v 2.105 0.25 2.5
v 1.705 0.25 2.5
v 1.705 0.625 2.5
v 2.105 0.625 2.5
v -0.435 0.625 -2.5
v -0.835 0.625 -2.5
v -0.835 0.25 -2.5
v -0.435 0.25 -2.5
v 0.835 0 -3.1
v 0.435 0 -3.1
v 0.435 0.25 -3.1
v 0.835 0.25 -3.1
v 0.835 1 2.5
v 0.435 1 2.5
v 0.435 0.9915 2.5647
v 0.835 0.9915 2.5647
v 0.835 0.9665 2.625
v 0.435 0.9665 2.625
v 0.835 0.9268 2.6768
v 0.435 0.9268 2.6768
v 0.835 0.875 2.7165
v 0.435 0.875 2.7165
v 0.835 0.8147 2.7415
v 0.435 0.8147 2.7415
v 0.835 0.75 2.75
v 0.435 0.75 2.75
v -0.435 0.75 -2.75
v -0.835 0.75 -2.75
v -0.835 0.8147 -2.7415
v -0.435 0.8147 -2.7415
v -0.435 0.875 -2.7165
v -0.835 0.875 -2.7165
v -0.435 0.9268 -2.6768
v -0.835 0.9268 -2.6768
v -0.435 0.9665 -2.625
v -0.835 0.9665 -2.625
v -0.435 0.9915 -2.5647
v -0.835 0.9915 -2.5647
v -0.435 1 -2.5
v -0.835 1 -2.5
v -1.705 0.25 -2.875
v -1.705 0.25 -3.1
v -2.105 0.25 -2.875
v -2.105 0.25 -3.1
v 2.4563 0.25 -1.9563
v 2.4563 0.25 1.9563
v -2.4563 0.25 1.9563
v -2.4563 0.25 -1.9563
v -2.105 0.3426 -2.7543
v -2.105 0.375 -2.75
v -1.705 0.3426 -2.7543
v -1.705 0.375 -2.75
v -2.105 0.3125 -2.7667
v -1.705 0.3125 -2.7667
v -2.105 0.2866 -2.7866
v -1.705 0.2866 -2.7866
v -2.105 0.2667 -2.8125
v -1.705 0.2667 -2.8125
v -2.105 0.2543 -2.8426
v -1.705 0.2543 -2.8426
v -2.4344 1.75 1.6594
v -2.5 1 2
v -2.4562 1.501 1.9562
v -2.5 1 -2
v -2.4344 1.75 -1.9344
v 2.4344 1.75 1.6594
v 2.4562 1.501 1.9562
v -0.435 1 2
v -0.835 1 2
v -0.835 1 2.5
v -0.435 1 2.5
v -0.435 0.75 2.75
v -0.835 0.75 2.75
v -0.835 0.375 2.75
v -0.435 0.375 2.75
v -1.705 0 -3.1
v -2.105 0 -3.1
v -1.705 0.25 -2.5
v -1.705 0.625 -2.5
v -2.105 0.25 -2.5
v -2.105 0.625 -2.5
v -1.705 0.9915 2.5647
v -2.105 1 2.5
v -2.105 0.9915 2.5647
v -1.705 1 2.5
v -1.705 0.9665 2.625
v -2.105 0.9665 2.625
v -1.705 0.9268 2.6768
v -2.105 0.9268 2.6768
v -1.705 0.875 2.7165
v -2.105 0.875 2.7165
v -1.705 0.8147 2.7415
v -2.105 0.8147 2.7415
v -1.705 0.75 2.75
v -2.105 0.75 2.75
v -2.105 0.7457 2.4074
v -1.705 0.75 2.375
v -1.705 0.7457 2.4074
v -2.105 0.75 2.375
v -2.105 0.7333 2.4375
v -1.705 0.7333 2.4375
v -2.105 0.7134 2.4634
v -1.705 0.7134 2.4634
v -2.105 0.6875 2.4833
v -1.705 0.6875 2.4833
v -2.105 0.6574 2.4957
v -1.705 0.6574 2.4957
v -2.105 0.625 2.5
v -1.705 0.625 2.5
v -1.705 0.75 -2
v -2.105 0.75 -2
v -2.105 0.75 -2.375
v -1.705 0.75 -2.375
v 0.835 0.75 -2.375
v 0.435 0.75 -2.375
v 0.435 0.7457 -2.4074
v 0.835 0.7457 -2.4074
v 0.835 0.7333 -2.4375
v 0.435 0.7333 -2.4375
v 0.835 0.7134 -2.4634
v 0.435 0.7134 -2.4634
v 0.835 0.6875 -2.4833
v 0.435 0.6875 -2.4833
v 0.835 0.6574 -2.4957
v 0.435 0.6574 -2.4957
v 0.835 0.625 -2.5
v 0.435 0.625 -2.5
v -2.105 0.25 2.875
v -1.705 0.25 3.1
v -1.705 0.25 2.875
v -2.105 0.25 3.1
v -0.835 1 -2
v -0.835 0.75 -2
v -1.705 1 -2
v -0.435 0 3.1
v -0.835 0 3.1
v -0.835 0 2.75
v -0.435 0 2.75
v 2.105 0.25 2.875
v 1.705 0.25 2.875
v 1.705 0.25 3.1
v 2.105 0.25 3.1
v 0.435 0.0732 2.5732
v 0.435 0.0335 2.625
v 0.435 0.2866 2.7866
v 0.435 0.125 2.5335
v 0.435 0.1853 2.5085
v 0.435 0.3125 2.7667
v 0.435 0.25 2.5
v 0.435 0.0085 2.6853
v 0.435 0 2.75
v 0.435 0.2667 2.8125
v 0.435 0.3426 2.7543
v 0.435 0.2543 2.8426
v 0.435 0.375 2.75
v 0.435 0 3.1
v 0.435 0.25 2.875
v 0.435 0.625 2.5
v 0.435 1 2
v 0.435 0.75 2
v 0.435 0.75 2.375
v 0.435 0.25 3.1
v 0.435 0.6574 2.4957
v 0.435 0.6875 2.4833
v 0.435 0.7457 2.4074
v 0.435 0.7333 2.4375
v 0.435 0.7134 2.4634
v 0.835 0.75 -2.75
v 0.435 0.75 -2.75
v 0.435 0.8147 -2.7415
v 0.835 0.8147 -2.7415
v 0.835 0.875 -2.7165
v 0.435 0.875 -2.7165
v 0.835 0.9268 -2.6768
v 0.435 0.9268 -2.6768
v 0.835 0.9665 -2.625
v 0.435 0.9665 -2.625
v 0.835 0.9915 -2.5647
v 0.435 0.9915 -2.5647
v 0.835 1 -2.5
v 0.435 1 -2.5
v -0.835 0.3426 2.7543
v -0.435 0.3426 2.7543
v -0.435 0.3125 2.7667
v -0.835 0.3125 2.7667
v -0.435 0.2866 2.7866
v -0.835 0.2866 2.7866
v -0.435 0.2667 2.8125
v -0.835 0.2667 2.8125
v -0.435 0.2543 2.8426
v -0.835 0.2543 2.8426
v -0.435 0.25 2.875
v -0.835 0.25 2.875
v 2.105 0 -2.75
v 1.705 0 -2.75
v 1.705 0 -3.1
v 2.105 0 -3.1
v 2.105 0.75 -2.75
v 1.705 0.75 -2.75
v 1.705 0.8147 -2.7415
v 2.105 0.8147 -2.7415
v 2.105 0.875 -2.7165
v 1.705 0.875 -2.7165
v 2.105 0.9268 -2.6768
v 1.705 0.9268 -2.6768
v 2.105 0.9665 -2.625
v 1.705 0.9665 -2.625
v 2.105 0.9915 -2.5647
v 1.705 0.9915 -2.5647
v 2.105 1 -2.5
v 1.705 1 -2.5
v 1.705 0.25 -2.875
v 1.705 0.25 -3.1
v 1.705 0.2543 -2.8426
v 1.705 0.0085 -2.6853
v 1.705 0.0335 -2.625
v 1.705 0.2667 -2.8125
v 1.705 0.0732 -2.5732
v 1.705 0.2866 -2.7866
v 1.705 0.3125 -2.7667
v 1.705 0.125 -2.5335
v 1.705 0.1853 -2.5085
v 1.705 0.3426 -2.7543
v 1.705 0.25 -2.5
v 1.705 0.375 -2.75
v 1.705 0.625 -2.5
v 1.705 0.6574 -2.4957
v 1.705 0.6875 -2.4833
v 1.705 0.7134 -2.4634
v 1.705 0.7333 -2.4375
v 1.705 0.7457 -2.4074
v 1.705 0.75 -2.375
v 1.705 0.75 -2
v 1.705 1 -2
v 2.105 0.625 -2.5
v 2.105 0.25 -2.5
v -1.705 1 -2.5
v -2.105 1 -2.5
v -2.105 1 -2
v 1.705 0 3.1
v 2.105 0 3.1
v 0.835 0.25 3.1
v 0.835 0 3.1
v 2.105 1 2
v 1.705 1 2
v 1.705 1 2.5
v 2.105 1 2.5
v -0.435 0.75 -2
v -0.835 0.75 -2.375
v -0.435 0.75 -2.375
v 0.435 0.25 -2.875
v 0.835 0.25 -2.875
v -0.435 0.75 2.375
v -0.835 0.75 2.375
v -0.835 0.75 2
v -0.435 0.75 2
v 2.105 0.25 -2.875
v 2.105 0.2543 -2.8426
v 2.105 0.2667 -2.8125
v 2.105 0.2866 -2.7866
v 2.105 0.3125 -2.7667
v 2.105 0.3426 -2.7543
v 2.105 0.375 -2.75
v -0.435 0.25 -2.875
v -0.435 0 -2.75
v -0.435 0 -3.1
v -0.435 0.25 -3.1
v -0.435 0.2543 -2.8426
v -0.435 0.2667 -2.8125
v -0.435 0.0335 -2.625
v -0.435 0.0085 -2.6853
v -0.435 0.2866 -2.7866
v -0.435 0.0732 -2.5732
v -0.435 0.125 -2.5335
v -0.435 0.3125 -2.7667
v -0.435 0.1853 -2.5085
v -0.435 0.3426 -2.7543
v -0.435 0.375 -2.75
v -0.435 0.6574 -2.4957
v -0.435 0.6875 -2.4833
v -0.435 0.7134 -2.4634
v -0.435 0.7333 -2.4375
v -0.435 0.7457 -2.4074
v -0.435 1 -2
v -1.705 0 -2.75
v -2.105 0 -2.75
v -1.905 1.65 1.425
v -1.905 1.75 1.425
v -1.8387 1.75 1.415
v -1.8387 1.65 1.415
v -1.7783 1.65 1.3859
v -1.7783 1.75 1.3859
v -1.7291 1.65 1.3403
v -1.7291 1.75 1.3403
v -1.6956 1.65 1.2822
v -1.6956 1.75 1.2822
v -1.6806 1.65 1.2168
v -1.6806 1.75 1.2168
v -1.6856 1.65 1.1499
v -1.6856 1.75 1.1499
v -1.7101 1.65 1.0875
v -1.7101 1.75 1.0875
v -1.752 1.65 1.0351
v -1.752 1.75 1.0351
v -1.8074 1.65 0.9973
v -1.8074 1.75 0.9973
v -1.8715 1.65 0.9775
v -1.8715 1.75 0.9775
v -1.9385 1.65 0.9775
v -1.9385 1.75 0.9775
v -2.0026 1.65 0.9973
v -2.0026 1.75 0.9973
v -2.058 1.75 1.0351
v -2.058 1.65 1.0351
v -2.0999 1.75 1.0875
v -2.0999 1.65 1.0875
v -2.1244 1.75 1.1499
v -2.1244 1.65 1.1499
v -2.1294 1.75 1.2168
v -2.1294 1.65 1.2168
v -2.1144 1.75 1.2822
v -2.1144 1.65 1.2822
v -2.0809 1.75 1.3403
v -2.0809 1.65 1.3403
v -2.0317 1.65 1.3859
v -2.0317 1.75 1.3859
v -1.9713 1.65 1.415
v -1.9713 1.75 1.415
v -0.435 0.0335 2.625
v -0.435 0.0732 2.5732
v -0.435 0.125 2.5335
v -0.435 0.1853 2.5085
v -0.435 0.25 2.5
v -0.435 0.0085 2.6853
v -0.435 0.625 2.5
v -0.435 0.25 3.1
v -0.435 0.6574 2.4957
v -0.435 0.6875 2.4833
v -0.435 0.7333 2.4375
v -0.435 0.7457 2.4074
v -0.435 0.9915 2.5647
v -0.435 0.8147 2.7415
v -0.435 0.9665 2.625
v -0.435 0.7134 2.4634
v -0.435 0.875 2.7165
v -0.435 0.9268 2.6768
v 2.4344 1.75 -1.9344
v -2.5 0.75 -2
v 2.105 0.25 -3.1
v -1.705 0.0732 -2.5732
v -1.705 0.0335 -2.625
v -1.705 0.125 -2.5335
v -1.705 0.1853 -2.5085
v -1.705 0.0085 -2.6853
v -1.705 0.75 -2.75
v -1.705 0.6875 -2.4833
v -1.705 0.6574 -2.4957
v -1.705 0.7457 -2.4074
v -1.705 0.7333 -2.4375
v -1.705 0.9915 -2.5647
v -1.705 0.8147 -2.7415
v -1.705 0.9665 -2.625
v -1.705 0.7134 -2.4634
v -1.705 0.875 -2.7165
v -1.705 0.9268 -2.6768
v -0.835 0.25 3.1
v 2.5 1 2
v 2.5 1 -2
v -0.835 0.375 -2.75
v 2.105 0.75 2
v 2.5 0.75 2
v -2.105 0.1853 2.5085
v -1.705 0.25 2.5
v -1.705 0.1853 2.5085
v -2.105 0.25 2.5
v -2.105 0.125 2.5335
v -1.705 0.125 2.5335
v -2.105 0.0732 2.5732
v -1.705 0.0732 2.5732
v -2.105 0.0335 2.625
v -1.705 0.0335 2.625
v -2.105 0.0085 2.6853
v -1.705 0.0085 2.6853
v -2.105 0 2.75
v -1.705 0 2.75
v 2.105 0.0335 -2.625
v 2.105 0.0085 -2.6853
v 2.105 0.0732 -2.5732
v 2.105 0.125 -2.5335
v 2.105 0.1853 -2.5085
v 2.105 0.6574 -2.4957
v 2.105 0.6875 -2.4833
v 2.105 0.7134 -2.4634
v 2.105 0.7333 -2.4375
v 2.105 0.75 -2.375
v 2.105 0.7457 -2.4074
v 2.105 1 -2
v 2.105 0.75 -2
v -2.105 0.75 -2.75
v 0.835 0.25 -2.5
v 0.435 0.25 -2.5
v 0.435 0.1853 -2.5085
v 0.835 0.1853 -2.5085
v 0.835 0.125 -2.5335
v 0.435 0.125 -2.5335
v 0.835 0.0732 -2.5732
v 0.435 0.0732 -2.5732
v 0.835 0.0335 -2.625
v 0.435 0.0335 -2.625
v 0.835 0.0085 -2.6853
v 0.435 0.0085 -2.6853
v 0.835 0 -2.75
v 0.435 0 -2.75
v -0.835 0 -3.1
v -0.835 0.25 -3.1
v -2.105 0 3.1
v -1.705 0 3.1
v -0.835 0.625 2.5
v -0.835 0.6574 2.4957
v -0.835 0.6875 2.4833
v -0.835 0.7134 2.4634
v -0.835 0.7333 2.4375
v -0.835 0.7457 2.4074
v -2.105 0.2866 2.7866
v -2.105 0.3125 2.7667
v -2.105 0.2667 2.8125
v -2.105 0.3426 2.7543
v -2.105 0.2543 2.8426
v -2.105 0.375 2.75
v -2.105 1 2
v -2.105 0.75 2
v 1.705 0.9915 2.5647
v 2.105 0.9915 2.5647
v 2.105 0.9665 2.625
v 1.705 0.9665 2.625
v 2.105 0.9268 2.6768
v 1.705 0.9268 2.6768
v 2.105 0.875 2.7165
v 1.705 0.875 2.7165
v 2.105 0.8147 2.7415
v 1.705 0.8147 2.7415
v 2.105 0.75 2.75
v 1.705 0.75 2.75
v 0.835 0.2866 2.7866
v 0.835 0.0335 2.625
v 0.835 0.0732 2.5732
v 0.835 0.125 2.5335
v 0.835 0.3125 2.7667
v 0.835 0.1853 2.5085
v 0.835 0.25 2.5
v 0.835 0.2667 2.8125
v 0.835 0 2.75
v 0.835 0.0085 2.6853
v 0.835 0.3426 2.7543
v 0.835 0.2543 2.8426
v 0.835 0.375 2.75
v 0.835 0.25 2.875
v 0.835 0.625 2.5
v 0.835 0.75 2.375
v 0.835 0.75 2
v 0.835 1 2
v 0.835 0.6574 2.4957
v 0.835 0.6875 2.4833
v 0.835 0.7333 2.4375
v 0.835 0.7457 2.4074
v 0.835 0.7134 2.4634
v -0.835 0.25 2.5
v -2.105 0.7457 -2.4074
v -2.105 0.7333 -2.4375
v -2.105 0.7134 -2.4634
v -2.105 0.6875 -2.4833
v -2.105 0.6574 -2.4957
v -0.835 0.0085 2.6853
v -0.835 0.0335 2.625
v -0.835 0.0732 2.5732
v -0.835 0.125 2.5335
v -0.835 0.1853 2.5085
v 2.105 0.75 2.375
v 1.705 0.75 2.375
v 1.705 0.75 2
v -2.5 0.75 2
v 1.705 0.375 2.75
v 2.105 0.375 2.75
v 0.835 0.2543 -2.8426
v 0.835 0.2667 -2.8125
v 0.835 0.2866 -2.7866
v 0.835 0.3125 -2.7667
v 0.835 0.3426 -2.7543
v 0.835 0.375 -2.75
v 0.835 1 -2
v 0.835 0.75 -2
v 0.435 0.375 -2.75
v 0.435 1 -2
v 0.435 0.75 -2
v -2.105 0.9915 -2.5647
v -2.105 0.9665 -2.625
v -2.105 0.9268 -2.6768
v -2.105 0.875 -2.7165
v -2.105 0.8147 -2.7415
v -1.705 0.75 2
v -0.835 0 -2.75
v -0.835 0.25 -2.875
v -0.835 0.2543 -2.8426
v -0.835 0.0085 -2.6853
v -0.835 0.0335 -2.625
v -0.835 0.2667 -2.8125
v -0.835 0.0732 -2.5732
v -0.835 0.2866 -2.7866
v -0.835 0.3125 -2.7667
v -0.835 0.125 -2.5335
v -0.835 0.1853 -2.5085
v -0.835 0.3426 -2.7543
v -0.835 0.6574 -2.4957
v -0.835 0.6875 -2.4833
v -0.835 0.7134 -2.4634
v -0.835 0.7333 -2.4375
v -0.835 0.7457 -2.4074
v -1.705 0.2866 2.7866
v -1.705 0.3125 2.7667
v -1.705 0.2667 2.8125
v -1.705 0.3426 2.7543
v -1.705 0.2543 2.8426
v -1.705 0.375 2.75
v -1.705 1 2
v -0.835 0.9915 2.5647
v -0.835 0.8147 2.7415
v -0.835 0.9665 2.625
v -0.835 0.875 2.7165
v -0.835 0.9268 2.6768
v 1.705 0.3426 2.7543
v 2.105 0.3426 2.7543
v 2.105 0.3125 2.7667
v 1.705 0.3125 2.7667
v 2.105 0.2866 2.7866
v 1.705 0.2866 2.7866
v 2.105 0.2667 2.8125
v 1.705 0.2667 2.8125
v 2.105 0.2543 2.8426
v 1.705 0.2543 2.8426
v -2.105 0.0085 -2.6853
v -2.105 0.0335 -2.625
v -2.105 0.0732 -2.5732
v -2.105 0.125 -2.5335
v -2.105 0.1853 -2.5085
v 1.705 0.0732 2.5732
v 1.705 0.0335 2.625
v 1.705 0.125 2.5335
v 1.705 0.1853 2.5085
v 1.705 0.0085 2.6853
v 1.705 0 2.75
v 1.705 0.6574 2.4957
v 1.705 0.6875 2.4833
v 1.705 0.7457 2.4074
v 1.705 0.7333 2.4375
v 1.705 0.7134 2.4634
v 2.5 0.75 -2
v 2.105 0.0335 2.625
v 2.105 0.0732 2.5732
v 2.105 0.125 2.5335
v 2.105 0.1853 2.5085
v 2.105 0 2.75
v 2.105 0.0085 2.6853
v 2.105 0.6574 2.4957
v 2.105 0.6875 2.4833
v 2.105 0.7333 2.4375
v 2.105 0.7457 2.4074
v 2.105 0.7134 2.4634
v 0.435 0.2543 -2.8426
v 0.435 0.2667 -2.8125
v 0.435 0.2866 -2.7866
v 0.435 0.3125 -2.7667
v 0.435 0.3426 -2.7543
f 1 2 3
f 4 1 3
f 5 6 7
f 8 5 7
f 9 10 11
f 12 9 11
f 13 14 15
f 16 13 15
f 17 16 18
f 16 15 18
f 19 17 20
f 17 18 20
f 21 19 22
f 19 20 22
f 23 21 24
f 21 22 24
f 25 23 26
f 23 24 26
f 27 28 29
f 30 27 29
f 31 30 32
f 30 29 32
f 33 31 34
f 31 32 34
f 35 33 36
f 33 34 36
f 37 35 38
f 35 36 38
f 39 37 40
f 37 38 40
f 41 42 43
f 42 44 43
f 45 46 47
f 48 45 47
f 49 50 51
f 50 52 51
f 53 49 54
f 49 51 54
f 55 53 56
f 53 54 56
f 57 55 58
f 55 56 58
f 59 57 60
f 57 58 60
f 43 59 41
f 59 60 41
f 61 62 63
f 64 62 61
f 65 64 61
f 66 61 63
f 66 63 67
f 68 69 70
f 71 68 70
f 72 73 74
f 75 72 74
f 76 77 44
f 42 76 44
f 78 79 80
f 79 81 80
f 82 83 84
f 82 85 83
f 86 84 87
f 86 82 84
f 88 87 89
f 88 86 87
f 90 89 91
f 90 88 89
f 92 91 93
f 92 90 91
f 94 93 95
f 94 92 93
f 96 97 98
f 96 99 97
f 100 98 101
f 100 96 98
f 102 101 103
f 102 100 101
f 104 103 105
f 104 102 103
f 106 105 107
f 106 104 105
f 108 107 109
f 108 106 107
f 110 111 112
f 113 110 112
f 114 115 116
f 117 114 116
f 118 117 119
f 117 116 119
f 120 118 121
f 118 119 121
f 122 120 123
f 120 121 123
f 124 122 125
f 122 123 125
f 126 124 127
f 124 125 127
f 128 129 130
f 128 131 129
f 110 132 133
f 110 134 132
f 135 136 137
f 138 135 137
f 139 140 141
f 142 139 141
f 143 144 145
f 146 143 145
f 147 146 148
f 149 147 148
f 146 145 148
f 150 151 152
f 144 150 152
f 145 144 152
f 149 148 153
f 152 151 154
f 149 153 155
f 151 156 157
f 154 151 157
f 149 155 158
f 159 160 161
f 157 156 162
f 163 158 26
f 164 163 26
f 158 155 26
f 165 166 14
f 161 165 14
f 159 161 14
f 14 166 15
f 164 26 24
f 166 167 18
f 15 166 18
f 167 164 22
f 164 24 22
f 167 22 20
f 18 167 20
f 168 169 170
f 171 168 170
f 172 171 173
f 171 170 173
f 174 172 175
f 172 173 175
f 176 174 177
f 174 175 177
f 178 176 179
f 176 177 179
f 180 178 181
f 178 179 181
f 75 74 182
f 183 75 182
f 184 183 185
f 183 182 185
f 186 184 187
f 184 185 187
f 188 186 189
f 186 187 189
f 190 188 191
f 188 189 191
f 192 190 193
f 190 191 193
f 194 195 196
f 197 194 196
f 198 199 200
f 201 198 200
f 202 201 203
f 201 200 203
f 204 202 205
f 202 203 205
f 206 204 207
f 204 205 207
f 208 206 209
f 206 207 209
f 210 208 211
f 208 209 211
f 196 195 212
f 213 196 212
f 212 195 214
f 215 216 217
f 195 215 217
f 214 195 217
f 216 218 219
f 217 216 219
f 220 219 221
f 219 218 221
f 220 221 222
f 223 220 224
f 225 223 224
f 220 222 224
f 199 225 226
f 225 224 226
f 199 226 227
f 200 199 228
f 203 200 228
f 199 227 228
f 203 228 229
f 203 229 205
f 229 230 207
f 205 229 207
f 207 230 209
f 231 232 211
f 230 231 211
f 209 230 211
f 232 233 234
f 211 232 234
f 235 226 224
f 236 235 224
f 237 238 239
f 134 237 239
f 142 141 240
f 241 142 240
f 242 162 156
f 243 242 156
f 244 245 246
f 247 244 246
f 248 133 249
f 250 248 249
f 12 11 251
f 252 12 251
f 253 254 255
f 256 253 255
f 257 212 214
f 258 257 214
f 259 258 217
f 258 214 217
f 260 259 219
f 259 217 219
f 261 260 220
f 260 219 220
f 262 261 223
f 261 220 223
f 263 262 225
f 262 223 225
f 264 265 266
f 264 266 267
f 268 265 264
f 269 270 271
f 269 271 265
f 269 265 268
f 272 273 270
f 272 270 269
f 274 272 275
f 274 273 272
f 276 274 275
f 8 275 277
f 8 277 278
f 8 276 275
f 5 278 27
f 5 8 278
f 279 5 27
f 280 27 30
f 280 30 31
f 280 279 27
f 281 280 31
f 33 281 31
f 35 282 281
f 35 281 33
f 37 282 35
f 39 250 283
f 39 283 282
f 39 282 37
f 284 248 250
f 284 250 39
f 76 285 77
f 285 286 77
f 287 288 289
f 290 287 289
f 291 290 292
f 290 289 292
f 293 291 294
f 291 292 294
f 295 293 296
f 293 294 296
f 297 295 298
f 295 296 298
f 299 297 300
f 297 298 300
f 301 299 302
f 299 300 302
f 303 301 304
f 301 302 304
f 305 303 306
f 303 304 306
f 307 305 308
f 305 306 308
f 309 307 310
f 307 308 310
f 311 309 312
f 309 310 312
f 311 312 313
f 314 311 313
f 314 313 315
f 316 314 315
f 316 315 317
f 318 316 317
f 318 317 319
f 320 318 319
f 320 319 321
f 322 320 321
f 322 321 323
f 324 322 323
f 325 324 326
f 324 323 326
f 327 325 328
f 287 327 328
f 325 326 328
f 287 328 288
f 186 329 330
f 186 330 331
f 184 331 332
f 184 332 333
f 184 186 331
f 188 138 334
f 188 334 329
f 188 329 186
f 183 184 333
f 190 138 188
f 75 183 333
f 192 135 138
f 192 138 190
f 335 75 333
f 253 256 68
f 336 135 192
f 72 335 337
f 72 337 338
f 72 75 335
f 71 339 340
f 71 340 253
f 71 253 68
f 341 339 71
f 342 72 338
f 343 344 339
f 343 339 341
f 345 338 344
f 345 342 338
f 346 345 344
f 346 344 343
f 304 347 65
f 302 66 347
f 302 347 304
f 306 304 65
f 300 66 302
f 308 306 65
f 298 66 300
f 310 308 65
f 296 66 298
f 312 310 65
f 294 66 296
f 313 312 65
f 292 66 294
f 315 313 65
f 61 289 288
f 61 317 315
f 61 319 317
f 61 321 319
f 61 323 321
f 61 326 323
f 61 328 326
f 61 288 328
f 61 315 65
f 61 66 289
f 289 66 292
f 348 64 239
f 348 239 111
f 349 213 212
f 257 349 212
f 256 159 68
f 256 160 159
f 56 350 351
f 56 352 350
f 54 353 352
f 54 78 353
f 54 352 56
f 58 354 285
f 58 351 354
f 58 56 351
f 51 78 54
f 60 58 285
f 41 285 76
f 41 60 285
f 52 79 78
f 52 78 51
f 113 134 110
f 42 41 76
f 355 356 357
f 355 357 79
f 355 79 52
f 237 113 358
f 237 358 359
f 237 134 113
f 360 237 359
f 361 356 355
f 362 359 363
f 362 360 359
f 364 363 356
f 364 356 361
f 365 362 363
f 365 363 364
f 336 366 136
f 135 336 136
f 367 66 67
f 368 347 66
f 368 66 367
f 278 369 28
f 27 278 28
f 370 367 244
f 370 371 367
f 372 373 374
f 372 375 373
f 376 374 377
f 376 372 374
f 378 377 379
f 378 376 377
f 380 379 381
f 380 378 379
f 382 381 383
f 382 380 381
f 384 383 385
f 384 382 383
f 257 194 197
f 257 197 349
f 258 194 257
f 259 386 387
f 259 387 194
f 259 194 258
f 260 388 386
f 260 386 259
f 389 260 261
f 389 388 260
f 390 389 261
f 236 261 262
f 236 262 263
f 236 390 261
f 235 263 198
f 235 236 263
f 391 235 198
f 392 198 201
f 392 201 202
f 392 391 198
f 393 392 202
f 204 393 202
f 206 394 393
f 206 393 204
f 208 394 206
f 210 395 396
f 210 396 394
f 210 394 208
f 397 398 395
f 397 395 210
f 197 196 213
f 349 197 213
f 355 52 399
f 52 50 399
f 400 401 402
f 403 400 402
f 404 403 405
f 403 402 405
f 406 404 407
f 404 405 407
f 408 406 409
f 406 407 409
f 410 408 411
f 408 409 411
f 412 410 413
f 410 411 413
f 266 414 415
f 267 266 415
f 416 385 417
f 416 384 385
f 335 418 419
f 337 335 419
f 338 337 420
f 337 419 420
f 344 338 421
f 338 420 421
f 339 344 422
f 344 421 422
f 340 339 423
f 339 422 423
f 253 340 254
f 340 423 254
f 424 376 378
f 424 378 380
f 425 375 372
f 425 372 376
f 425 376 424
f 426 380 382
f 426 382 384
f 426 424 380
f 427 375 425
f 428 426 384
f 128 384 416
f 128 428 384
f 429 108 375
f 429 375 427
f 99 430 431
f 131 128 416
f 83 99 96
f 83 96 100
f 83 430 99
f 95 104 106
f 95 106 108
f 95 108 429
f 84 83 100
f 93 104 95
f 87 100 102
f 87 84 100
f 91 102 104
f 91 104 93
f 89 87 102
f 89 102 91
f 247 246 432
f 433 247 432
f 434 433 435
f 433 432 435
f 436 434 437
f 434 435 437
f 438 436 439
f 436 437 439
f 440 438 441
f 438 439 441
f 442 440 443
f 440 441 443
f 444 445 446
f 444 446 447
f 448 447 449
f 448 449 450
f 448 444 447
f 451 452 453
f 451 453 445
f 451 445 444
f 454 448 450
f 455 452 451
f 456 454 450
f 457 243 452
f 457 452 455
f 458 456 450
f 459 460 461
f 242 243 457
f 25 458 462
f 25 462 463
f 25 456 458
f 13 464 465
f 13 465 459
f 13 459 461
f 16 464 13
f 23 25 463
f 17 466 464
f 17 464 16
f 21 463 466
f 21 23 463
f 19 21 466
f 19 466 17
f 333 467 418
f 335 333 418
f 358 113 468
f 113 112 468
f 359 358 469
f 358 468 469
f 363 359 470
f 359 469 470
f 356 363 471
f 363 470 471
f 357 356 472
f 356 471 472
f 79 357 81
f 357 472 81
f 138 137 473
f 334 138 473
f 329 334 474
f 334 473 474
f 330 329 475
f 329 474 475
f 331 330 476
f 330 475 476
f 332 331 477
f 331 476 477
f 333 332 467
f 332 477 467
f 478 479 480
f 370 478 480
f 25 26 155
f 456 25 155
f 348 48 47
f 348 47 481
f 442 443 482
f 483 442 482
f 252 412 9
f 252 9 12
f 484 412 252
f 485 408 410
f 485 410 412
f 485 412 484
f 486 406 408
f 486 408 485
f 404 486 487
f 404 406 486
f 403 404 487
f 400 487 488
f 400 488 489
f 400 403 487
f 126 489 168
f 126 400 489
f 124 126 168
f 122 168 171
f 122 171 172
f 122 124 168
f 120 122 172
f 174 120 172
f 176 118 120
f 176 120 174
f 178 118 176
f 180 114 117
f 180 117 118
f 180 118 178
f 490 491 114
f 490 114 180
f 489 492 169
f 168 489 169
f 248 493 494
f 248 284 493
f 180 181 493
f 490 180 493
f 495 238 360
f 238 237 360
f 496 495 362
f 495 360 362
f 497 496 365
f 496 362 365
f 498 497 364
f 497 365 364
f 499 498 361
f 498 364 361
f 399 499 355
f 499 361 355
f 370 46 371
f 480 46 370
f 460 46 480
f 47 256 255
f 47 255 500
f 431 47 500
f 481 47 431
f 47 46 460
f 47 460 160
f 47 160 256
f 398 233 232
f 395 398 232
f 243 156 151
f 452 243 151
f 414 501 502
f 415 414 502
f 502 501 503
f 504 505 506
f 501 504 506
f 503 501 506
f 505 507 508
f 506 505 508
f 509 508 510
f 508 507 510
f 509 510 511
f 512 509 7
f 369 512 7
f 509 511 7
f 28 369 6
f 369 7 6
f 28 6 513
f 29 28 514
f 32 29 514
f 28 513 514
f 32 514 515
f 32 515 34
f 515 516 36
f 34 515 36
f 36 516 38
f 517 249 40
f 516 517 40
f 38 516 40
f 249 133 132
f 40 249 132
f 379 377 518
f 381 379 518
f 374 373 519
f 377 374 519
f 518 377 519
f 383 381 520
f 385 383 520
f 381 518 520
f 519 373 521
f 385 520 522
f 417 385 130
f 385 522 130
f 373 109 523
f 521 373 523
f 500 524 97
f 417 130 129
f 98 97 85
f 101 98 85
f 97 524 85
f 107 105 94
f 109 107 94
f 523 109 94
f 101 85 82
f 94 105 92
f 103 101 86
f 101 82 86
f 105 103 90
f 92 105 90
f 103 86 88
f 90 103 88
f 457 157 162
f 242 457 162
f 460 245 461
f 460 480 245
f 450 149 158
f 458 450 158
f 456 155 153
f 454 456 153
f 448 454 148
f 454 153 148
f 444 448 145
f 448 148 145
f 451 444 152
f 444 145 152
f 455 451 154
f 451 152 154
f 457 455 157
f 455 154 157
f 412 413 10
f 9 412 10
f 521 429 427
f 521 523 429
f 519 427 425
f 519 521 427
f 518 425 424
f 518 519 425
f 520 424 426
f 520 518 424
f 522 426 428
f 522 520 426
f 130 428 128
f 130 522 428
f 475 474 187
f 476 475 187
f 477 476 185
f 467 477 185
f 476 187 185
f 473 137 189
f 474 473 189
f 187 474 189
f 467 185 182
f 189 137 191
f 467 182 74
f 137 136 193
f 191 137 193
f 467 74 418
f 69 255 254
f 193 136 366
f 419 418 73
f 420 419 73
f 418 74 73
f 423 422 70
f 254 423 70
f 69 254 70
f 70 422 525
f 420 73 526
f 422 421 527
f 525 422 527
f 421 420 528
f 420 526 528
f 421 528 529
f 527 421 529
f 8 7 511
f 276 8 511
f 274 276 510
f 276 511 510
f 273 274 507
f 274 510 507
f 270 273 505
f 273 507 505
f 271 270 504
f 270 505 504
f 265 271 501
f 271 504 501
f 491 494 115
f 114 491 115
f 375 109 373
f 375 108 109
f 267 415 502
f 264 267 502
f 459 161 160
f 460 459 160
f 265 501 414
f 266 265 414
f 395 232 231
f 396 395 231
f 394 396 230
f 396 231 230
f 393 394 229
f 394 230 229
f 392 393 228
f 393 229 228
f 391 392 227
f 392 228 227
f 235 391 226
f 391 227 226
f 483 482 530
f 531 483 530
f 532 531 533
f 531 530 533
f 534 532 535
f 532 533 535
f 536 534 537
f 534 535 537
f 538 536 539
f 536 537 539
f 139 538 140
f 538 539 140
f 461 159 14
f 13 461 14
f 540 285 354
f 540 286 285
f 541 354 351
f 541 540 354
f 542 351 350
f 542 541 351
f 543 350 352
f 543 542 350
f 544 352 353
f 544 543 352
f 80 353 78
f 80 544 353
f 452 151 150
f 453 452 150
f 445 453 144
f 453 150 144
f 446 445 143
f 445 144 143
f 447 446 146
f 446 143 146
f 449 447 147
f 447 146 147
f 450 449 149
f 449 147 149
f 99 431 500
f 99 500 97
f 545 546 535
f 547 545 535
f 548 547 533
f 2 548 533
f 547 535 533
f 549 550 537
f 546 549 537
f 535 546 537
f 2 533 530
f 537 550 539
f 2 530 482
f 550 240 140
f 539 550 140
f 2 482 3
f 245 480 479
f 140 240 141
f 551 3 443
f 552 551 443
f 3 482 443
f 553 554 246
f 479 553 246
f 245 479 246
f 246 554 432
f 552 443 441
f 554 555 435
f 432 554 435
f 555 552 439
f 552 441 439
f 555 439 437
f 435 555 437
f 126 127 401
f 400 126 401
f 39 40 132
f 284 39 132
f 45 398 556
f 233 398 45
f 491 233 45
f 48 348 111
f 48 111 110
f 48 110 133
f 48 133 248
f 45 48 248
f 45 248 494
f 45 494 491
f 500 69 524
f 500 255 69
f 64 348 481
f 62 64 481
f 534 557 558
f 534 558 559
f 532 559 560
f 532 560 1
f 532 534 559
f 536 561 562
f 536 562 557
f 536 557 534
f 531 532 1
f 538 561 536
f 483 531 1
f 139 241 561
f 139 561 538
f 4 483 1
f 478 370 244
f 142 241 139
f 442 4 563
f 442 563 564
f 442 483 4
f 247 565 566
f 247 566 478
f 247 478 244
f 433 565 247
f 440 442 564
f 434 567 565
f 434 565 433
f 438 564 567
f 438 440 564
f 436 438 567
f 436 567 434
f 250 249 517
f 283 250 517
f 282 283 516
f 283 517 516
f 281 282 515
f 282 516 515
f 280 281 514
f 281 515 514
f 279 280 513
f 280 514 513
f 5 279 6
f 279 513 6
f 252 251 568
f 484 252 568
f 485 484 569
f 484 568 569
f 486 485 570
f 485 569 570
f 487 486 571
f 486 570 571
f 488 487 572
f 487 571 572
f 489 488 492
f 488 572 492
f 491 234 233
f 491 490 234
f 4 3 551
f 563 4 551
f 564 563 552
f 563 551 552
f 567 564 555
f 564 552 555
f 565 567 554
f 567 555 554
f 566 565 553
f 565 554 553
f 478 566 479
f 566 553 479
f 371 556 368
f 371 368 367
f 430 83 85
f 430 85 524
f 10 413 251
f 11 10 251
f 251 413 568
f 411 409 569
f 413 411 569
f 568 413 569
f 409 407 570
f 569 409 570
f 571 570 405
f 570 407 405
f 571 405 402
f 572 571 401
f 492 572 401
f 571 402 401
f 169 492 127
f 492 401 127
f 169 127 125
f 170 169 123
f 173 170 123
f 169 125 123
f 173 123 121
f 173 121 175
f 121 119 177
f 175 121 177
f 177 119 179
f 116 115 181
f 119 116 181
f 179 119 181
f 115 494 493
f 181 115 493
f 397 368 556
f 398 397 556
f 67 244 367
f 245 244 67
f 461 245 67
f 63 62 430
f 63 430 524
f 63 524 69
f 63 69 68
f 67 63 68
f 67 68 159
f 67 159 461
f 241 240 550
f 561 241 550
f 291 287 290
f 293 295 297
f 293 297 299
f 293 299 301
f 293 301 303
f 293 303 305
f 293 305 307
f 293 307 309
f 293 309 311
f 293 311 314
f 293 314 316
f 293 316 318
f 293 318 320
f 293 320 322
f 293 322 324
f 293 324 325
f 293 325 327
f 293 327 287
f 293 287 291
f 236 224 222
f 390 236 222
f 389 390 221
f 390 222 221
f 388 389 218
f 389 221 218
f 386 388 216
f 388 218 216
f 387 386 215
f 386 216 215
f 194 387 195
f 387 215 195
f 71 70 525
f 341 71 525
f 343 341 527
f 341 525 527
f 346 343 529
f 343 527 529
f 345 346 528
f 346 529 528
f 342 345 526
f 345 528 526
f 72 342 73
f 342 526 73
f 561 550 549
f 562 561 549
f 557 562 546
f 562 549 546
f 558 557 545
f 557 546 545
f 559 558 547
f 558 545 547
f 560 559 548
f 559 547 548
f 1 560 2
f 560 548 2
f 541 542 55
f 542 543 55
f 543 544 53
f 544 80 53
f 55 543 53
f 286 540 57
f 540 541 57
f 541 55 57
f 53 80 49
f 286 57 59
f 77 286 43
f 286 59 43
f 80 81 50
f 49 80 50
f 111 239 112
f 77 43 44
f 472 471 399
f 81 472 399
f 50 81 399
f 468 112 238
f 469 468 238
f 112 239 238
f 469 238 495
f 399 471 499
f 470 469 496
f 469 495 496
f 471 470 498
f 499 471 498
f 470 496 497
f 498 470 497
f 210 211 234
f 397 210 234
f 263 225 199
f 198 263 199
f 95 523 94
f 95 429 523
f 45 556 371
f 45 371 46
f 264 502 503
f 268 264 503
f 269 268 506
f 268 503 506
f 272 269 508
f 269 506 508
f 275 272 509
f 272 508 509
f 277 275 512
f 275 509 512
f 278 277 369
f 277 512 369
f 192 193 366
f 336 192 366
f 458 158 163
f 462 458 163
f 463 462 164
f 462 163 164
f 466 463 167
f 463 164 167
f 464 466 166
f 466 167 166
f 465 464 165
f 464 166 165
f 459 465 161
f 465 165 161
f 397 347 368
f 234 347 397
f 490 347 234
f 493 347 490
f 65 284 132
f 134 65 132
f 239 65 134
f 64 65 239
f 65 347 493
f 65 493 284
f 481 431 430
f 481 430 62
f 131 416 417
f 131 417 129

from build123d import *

# Parameters (mm, degrees)
SKETCH2_W            = 5
SKETCH2_H            = 4
PACKAGE_DEPTH        = 1.5
DRAFT1_START         = -2.5
DRAFT1_DEPTH         = 5
DRAFT1_START_2       = -3
DRAFT1_2_DEPTH       = 6
DRAFT2_START         = -2
DRAFT2_DEPTH         = 4
DRAFT2_START_2       = -3
DRAFT2_2_DEPTH       = 6
CHAMFER1_SIZE        = 0.25
CHAMFER1_SIZE2       = 0.275015717
LEADS_DEPTH          = 0.2
FILLET1_R            = 0.25
FILLET2_R            = 0.125
FILLET1_OF_MIRROR1_R = 0.25
FILLET2_OF_MIRROR1_R = 0.125
LPATTERN1_START      = -0.835
LPATTERN1_DEPTH      = 0.4
LPATTERN1_START_2    = 0.435
LPATTERN1_2_DEPTH    = 0.4
LPATTERN1_START_3    = 1.705
LPATTERN1_3_DEPTH    = 0.4
SKETCH4_R            = 0.225
MARKER_DEPTH         = 0.1


with BuildPart() as part:
    # Sketch2 → Package (new body)
    with BuildSketch(Plane(origin=(0, 0.25, 0), x_dir=(-1, 0, 0), z_dir=(0, 1, 0))):
        Rectangle(SKETCH2_W, SKETCH2_H)
    extrude(amount=PACKAGE_DEPTH)

    # Draft1: read off the stored shape, not the designer's step
    # Draft1 outline → Draft1 (cut)
    with BuildSketch(Plane.YZ.offset(DRAFT1_START)):
        Polygon((1.75, -2), (1.75, -1.934383502), (1, -2), align=None)
        Polygon((1, 2), (1.75, 1.934383502), (1.75, 2), align=None)
    extrude(amount=DRAFT1_DEPTH, mode=Mode.SUBTRACT)

    # Draft1 2 outline → Draft1 2 (cut)
    with BuildSketch(Plane.XY.offset(DRAFT1_START_2)):
        Polygon((-2.5, 1), (-2.434383502, 1.75), (-2.5, 1.75), align=None)
        Polygon((2.434383502, 1.75), (2.5, 1), (2.5, 1.75), align=None)
    extrude(amount=DRAFT1_2_DEPTH, mode=Mode.SUBTRACT)

    # Draft2: read off the stored shape, not the designer's step
    # Draft2 outline → Draft2 (cut)
    with BuildSketch(Plane.XY.offset(DRAFT2_START)):
        Polygon((2.5, 0.75), (2.456255668, 0.25), (2.5, 0.25), align=None)
        Polygon((-2.456255668, 0.25), (-2.5, 0.75), (-2.5, 0.25), align=None)
    extrude(amount=DRAFT2_DEPTH, mode=Mode.SUBTRACT)

    # Draft2 2 outline → Draft2 2 (cut)
    with BuildSketch(Plane.YZ.offset(DRAFT2_START_2)):
        Polygon((0.75, -2), (0.25, -1.956255668), (0.25, -2), align=None)
        Polygon((0.25, 1.956255668), (0.75, 2), (0.25, 2), align=None)
    extrude(amount=DRAFT2_2_DEPTH, mode=Mode.SUBTRACT)

    # Chamfer1
    chamfer1_edges = [part.edges().sort_by_distance(p)[0] for p in [
        (0, 1.75, 1.934383502),
    ]]
    chamfer1_side = [part.faces().sort_by_distance(p)[0] for p in [
        (0, 1.373337774, 1.967337177),
    ]]
    chamfer(chamfer1_edges, length=CHAMFER1_SIZE, length2=CHAMFER1_SIZE2, reference=chamfer1_side[0])

    # Sketch3 → Leads (add, symmetric)
    with BuildSketch(Plane.ZY.offset(1.905)):
        Polygon((-2, 1), (-2, 0.75), (2.5, 0.75), (2.5, 0), (3.1, 0), (3.1, 0.25), (2.75, 0.25), (2.75, 1), align=None)
    leads = extrude(amount=LEADS_DEPTH, both=True)

    # Fillet1
    fillet1_edges = [part.edges().sort_by_distance(p)[0] for p in [
        (-1.905, 1, 2.75),
        (-1.905, 0, 2.5),
    ]]
    fillet(fillet1_edges, radius=FILLET1_R)

    # Fillet2
    fillet2_edges = [part.edges().sort_by_distance(p)[0] for p in [
        (-1.905, 0.75, 2.5),
        (-1.905, 0.25, 2.75),
    ]]
    fillet(fillet2_edges, radius=FILLET2_R)

    # Mirror1: Leads across plane
    add(leads.mirror(Plane.XY))

    # Fillet1 of Mirror1
    fillet1_of_mirror1_edges = [part.edges().sort_by_distance(p)[0] for p in [
        (-1.905, 1, -2.75),
        (-1.905, 0, -2.5),
    ]]
    fillet(fillet1_of_mirror1_edges, radius=FILLET1_OF_MIRROR1_R)

    # Fillet2 of Mirror1
    fillet2_of_mirror1_edges = [part.edges().sort_by_distance(p)[0] for p in [
        (-1.905, 0.75, -2.5),
        (-1.905, 0.25, -2.75),
    ]]
    fillet(fillet2_of_mirror1_edges, radius=FILLET2_OF_MIRROR1_R)

    # LPattern1: read off the stored shape, not the designer's step
    # LPattern1 outline → LPattern1 (add)
    with BuildSketch(Plane.YZ.offset(LPATTERN1_START)):
        with BuildLine():
            Line((1, 2), (1, 2.5))
            ThreePointArc((1, 2.5), (0.926776695, 2.676776695), (0.75, 2.75))
            Line((0.75, 2.75), (0.375, 2.75))
            ThreePointArc((0.375, 2.75), (0.286611652, 2.786611652), (0.25, 2.875))
            Line((0.25, 2.875), (0.25, 3.1))
            Line((0.25, 3.1), (0, 3.1))
            Line((0, 3.1), (0, 2.75))
            ThreePointArc((0, 2.75), (0.073223305, 2.573223305), (0.25, 2.5))
            Line((0.25, 2.5), (0.625, 2.5))
            ThreePointArc((0.625, 2.5), (0.713388348, 2.463388348), (0.75, 2.375))
            Line((0.75, 2.375), (0.75, 2))
            Line((0.75, 2), (1, 2))
        make_face()
        with BuildLine():
            ThreePointArc((0.75, -2.75), (0.926776695, -2.676776695), (1, -2.5))
            Line((1, -2.5), (1, -2))
            Line((1, -2), (0.75, -2))
            Line((0.75, -2), (0.75, -2.375))
            ThreePointArc((0.75, -2.375), (0.713388348, -2.463388348), (0.625, -2.5))
            Line((0.625, -2.5), (0.25, -2.5))
            ThreePointArc((0.25, -2.5), (0.073223305, -2.573223305), (0, -2.75))
            Line((0, -2.75), (0, -3.1))
            Line((0, -3.1), (0.25, -3.1))
            Line((0.25, -3.1), (0.25, -2.875))
            ThreePointArc((0.25, -2.875), (0.286611652, -2.786611652), (0.375, -2.75))
            Line((0.375, -2.75), (0.75, -2.75))
        make_face()
    extrude(amount=LPATTERN1_DEPTH)

    # LPattern1 2 outline → LPattern1 2 (add)
    with BuildSketch(Plane.YZ.offset(LPATTERN1_START_2)):
        with BuildLine():
            Line((1, 2), (1, 2.5))
            ThreePointArc((1, 2.5), (0.926776695, 2.676776695), (0.75, 2.75))
            Line((0.75, 2.75), (0.375, 2.75))
            ThreePointArc((0.375, 2.75), (0.286611652, 2.786611652), (0.25, 2.875))
            Line((0.25, 2.875), (0.25, 3.1))
            Line((0.25, 3.1), (0, 3.1))
            Line((0, 3.1), (0, 2.75))
            ThreePointArc((0, 2.75), (0.073223305, 2.573223305), (0.25, 2.5))
            Line((0.25, 2.5), (0.625, 2.5))
            ThreePointArc((0.625, 2.5), (0.713388348, 2.463388348), (0.75, 2.375))
            Line((0.75, 2.375), (0.75, 2))
            Line((0.75, 2), (1, 2))
        make_face()
        with BuildLine():
            ThreePointArc((0.75, -2.75), (0.926776695, -2.676776695), (1, -2.5))
            Line((1, -2.5), (1, -2))
            Line((1, -2), (0.75, -2))
            Line((0.75, -2), (0.75, -2.375))
            ThreePointArc((0.75, -2.375), (0.713388348, -2.463388348), (0.625, -2.5))
            Line((0.625, -2.5), (0.25, -2.5))
            ThreePointArc((0.25, -2.5), (0.073223305, -2.573223305), (0, -2.75))
            Line((0, -2.75), (0, -3.1))
            Line((0, -3.1), (0.25, -3.1))
            Line((0.25, -3.1), (0.25, -2.875))
            ThreePointArc((0.25, -2.875), (0.286611652, -2.786611652), (0.375, -2.75))
            Line((0.375, -2.75), (0.75, -2.75))
        make_face()
    extrude(amount=LPATTERN1_2_DEPTH)

    # LPattern1 3 outline → LPattern1 3 (add)
    with BuildSketch(Plane.YZ.offset(LPATTERN1_START_3)):
        with BuildLine():
            Line((1, 2), (1, 2.5))
            ThreePointArc((1, 2.5), (0.926776695, 2.676776695), (0.75, 2.75))
            Line((0.75, 2.75), (0.375, 2.75))
            ThreePointArc((0.375, 2.75), (0.286611652, 2.786611652), (0.25, 2.875))
            Line((0.25, 2.875), (0.25, 3.1))
            Line((0.25, 3.1), (0, 3.1))
            Line((0, 3.1), (0, 2.75))
            ThreePointArc((0, 2.75), (0.073223305, 2.573223305), (0.25, 2.5))
            Line((0.25, 2.5), (0.625, 2.5))
            ThreePointArc((0.625, 2.5), (0.713388348, 2.463388348), (0.75, 2.375))
            Line((0.75, 2.375), (0.75, 2))
            Line((0.75, 2), (1, 2))
        make_face()
        with BuildLine():
            ThreePointArc((0.75, -2.75), (0.926776695, -2.676776695), (1, -2.5))
            Line((1, -2.5), (1, -2))
            Line((1, -2), (0.75, -2))
            Line((0.75, -2), (0.75, -2.375))
            ThreePointArc((0.75, -2.375), (0.713388348, -2.463388348), (0.625, -2.5))
            Line((0.625, -2.5), (0.25, -2.5))
            ThreePointArc((0.25, -2.5), (0.073223305, -2.573223305), (0, -2.75))
            Line((0, -2.75), (0, -3.1))
            Line((0, -3.1), (0.25, -3.1))
            Line((0.25, -3.1), (0.25, -2.875))
            ThreePointArc((0.25, -2.875), (0.286611652, -2.786611652), (0.375, -2.75))
            Line((0.375, -2.75), (0.75, -2.75))
        make_face()
    extrude(amount=LPATTERN1_3_DEPTH)

    # Sketch4 → Marker (cut)
    with BuildSketch(Plane(origin=(0, 1.75, 0), x_dir=(1, 0, 0), z_dir=(0, 1, 0))):
        with Locations(Location((-1.905, -1.2, 0), (0, 0, 270))):
            Circle(SKETCH4_R)
    extrude(amount=-MARKER_DEPTH, mode=Mode.SUBTRACT)


solid = part.part
